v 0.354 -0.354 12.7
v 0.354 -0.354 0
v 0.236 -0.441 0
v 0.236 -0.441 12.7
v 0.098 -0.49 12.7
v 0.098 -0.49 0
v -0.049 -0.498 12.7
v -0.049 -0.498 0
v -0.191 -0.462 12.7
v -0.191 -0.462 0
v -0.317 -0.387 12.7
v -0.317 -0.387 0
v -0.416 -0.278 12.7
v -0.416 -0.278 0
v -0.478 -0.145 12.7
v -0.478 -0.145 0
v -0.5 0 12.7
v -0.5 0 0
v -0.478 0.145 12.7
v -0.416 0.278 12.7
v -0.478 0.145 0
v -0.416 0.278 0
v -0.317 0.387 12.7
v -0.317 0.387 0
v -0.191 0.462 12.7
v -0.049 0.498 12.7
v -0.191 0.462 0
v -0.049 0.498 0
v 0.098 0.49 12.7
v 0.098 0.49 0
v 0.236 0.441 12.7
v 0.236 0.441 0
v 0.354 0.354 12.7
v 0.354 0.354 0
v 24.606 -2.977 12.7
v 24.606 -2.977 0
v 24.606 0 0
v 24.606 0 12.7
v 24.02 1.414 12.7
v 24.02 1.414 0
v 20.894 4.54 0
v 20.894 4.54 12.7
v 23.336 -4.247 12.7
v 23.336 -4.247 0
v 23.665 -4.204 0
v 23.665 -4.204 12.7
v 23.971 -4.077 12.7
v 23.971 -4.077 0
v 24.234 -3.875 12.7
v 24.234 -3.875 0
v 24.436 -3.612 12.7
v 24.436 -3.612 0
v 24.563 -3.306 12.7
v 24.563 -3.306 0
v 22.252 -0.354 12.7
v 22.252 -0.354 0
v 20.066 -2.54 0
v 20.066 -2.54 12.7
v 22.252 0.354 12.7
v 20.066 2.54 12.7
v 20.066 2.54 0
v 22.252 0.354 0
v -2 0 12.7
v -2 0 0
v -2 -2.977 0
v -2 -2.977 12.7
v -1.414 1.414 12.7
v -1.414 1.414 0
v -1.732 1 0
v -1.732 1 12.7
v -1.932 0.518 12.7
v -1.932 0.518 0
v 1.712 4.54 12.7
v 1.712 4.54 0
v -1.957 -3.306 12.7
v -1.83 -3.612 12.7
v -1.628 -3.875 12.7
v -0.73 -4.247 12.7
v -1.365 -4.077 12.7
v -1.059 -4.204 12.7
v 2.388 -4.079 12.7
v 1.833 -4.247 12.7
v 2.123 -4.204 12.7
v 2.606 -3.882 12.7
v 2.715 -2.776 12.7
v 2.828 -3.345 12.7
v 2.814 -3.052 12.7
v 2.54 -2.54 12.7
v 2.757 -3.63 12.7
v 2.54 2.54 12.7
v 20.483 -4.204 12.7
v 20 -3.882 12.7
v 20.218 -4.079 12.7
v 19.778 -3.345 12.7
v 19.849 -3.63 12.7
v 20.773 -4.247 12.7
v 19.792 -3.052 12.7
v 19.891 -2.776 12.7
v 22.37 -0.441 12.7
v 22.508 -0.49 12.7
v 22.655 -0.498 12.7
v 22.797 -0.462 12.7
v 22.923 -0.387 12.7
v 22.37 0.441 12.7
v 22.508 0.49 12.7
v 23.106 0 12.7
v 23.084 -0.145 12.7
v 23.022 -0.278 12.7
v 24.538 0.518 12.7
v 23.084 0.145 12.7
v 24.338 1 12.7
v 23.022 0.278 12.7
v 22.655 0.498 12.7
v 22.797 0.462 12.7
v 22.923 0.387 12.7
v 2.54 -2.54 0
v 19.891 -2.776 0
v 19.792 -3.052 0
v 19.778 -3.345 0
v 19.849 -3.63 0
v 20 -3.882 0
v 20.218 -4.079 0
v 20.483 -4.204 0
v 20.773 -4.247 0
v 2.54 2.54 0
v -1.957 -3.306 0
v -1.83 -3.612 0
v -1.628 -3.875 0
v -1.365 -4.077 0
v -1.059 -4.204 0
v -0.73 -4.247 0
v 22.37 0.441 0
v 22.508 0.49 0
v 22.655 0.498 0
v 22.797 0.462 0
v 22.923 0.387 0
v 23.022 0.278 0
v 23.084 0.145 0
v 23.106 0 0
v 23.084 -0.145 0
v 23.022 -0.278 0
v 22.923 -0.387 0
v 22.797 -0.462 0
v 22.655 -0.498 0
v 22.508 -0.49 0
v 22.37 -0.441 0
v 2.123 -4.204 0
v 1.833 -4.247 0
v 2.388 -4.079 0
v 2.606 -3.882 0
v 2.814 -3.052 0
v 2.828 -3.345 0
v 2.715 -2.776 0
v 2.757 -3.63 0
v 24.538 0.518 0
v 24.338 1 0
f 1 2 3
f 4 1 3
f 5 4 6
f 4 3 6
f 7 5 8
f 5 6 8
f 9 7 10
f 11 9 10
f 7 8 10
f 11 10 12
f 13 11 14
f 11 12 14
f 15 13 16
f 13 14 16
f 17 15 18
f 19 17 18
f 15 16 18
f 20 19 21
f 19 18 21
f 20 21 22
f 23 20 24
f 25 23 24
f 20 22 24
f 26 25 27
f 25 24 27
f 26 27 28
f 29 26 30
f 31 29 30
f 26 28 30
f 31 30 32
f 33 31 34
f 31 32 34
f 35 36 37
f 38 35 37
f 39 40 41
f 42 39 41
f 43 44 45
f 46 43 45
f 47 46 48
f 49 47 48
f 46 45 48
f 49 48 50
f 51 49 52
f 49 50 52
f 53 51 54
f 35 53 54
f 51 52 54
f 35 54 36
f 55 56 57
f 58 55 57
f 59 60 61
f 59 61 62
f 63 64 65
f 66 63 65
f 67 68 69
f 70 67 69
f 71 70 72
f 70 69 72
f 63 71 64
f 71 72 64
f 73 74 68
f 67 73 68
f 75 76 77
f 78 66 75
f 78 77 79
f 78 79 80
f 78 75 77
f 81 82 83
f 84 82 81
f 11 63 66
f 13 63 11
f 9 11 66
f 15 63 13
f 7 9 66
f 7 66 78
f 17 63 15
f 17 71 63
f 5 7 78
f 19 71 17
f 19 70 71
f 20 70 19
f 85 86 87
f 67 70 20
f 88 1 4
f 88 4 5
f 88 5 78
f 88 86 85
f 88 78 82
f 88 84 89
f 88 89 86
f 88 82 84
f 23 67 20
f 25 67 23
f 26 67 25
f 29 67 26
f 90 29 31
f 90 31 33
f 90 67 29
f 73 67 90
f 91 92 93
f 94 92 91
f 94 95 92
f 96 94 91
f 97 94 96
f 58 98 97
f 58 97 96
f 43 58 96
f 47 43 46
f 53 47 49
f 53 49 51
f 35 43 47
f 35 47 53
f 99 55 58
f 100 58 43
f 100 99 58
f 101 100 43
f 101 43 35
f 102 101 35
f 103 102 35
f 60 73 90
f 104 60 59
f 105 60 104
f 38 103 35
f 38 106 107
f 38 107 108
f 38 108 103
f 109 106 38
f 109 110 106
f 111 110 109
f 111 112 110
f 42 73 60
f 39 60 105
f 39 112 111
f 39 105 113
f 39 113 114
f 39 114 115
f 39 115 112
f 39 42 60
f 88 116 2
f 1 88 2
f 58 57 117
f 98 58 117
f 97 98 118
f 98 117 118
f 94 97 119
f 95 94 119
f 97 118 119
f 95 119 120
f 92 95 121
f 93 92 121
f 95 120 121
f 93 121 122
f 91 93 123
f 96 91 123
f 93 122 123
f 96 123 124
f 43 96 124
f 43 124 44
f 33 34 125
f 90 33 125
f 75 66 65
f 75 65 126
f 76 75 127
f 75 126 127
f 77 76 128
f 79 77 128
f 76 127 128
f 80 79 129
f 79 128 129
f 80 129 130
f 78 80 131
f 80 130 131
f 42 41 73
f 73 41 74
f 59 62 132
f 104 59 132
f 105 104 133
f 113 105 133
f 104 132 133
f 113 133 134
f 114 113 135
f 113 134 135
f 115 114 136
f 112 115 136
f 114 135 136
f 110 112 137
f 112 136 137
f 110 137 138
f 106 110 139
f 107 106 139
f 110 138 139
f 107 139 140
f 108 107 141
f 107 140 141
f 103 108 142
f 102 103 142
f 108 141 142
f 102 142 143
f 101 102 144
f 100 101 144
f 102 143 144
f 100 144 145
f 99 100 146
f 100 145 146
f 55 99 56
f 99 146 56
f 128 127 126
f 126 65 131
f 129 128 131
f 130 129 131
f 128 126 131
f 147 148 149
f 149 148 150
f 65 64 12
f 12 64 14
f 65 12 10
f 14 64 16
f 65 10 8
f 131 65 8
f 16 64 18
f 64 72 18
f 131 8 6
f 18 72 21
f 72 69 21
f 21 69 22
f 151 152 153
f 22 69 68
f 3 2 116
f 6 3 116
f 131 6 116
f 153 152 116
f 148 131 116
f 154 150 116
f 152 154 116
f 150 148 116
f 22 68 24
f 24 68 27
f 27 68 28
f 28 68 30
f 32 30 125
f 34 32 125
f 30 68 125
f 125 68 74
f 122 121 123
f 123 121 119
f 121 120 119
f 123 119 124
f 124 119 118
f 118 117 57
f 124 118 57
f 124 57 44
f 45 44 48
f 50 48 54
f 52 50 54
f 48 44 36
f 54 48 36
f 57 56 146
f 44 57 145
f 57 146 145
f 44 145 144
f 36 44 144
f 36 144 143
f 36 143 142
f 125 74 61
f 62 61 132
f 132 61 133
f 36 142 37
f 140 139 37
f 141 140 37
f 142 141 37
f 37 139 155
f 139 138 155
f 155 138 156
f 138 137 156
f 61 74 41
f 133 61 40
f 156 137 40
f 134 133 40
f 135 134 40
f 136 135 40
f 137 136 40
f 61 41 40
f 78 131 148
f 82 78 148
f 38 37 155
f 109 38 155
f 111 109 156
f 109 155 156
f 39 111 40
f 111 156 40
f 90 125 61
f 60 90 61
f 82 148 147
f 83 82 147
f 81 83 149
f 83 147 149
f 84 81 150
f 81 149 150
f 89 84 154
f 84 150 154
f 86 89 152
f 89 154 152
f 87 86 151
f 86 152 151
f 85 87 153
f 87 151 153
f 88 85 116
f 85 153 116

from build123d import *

# Parameters (mm, degrees)
F1_DEPTH = 12.7


with BuildPart() as f1:
    # F0 (on Top) → F1 (new body)
    with BuildSketch(Plane.XY):
        with BuildLine():
            ThreePointArc((0.353553, -0.353553), (-0.5, 0), (0.353553, 0.353553))
            Line((0.353553, 0.353553), (2.54, 2.54))
            Line((2.54, 2.54), (11.696242, 2.54))
            Line((11.696242, 2.54), (20.066, 2.54))
            Line((20.066, 2.54), (22.252447, 0.353553))
            ThreePointArc((22.252447, 0.353553), (23.106, 0), (22.252447, -0.353553))
            Line((22.252447, -0.353553), (20.066, -2.54))
            ThreePointArc((20.066, -2.54), (19.849227, -3.62979), (20.773107, -4.247107))
            Line((20.773107, -4.247107), (23.336, -4.247107))
            ThreePointArc((23.336, -4.247107), (24.234026, -3.875132), (24.606, -2.977107))
            Line((24.606, -2.977107), (24.606, 0))
            ThreePointArc((24.606, 0), (24.453759, 0.765367), (24.020214, 1.414214))
            Line((24.020214, 1.414214), (20.894427, 4.54))
            Line((20.894427, 4.54), (11.696242, 4.54))
            Line((11.696242, 4.54), (1.711573, 4.54))
            Line((1.711573, 4.54), (-1.414214, 1.414214))
            ThreePointArc((-1.414214, 1.414214), (-1.847759, 0.765367), (-2, 0))
            Line((-2, 0), (-2, -2.977107))
            ThreePointArc((-2, -2.977107), (-1.628026, -3.875132), (-0.73, -4.247107))
            Line((-0.73, -4.247107), (1.832893, -4.247107))
            ThreePointArc((1.832893, -4.247107), (2.756773, -3.62979), (2.54, -2.54))
            Line((2.54, -2.54), (0.353553, -0.353553))
        make_face()
    extrude(amount=F1_DEPTH)


solid = f1.part
